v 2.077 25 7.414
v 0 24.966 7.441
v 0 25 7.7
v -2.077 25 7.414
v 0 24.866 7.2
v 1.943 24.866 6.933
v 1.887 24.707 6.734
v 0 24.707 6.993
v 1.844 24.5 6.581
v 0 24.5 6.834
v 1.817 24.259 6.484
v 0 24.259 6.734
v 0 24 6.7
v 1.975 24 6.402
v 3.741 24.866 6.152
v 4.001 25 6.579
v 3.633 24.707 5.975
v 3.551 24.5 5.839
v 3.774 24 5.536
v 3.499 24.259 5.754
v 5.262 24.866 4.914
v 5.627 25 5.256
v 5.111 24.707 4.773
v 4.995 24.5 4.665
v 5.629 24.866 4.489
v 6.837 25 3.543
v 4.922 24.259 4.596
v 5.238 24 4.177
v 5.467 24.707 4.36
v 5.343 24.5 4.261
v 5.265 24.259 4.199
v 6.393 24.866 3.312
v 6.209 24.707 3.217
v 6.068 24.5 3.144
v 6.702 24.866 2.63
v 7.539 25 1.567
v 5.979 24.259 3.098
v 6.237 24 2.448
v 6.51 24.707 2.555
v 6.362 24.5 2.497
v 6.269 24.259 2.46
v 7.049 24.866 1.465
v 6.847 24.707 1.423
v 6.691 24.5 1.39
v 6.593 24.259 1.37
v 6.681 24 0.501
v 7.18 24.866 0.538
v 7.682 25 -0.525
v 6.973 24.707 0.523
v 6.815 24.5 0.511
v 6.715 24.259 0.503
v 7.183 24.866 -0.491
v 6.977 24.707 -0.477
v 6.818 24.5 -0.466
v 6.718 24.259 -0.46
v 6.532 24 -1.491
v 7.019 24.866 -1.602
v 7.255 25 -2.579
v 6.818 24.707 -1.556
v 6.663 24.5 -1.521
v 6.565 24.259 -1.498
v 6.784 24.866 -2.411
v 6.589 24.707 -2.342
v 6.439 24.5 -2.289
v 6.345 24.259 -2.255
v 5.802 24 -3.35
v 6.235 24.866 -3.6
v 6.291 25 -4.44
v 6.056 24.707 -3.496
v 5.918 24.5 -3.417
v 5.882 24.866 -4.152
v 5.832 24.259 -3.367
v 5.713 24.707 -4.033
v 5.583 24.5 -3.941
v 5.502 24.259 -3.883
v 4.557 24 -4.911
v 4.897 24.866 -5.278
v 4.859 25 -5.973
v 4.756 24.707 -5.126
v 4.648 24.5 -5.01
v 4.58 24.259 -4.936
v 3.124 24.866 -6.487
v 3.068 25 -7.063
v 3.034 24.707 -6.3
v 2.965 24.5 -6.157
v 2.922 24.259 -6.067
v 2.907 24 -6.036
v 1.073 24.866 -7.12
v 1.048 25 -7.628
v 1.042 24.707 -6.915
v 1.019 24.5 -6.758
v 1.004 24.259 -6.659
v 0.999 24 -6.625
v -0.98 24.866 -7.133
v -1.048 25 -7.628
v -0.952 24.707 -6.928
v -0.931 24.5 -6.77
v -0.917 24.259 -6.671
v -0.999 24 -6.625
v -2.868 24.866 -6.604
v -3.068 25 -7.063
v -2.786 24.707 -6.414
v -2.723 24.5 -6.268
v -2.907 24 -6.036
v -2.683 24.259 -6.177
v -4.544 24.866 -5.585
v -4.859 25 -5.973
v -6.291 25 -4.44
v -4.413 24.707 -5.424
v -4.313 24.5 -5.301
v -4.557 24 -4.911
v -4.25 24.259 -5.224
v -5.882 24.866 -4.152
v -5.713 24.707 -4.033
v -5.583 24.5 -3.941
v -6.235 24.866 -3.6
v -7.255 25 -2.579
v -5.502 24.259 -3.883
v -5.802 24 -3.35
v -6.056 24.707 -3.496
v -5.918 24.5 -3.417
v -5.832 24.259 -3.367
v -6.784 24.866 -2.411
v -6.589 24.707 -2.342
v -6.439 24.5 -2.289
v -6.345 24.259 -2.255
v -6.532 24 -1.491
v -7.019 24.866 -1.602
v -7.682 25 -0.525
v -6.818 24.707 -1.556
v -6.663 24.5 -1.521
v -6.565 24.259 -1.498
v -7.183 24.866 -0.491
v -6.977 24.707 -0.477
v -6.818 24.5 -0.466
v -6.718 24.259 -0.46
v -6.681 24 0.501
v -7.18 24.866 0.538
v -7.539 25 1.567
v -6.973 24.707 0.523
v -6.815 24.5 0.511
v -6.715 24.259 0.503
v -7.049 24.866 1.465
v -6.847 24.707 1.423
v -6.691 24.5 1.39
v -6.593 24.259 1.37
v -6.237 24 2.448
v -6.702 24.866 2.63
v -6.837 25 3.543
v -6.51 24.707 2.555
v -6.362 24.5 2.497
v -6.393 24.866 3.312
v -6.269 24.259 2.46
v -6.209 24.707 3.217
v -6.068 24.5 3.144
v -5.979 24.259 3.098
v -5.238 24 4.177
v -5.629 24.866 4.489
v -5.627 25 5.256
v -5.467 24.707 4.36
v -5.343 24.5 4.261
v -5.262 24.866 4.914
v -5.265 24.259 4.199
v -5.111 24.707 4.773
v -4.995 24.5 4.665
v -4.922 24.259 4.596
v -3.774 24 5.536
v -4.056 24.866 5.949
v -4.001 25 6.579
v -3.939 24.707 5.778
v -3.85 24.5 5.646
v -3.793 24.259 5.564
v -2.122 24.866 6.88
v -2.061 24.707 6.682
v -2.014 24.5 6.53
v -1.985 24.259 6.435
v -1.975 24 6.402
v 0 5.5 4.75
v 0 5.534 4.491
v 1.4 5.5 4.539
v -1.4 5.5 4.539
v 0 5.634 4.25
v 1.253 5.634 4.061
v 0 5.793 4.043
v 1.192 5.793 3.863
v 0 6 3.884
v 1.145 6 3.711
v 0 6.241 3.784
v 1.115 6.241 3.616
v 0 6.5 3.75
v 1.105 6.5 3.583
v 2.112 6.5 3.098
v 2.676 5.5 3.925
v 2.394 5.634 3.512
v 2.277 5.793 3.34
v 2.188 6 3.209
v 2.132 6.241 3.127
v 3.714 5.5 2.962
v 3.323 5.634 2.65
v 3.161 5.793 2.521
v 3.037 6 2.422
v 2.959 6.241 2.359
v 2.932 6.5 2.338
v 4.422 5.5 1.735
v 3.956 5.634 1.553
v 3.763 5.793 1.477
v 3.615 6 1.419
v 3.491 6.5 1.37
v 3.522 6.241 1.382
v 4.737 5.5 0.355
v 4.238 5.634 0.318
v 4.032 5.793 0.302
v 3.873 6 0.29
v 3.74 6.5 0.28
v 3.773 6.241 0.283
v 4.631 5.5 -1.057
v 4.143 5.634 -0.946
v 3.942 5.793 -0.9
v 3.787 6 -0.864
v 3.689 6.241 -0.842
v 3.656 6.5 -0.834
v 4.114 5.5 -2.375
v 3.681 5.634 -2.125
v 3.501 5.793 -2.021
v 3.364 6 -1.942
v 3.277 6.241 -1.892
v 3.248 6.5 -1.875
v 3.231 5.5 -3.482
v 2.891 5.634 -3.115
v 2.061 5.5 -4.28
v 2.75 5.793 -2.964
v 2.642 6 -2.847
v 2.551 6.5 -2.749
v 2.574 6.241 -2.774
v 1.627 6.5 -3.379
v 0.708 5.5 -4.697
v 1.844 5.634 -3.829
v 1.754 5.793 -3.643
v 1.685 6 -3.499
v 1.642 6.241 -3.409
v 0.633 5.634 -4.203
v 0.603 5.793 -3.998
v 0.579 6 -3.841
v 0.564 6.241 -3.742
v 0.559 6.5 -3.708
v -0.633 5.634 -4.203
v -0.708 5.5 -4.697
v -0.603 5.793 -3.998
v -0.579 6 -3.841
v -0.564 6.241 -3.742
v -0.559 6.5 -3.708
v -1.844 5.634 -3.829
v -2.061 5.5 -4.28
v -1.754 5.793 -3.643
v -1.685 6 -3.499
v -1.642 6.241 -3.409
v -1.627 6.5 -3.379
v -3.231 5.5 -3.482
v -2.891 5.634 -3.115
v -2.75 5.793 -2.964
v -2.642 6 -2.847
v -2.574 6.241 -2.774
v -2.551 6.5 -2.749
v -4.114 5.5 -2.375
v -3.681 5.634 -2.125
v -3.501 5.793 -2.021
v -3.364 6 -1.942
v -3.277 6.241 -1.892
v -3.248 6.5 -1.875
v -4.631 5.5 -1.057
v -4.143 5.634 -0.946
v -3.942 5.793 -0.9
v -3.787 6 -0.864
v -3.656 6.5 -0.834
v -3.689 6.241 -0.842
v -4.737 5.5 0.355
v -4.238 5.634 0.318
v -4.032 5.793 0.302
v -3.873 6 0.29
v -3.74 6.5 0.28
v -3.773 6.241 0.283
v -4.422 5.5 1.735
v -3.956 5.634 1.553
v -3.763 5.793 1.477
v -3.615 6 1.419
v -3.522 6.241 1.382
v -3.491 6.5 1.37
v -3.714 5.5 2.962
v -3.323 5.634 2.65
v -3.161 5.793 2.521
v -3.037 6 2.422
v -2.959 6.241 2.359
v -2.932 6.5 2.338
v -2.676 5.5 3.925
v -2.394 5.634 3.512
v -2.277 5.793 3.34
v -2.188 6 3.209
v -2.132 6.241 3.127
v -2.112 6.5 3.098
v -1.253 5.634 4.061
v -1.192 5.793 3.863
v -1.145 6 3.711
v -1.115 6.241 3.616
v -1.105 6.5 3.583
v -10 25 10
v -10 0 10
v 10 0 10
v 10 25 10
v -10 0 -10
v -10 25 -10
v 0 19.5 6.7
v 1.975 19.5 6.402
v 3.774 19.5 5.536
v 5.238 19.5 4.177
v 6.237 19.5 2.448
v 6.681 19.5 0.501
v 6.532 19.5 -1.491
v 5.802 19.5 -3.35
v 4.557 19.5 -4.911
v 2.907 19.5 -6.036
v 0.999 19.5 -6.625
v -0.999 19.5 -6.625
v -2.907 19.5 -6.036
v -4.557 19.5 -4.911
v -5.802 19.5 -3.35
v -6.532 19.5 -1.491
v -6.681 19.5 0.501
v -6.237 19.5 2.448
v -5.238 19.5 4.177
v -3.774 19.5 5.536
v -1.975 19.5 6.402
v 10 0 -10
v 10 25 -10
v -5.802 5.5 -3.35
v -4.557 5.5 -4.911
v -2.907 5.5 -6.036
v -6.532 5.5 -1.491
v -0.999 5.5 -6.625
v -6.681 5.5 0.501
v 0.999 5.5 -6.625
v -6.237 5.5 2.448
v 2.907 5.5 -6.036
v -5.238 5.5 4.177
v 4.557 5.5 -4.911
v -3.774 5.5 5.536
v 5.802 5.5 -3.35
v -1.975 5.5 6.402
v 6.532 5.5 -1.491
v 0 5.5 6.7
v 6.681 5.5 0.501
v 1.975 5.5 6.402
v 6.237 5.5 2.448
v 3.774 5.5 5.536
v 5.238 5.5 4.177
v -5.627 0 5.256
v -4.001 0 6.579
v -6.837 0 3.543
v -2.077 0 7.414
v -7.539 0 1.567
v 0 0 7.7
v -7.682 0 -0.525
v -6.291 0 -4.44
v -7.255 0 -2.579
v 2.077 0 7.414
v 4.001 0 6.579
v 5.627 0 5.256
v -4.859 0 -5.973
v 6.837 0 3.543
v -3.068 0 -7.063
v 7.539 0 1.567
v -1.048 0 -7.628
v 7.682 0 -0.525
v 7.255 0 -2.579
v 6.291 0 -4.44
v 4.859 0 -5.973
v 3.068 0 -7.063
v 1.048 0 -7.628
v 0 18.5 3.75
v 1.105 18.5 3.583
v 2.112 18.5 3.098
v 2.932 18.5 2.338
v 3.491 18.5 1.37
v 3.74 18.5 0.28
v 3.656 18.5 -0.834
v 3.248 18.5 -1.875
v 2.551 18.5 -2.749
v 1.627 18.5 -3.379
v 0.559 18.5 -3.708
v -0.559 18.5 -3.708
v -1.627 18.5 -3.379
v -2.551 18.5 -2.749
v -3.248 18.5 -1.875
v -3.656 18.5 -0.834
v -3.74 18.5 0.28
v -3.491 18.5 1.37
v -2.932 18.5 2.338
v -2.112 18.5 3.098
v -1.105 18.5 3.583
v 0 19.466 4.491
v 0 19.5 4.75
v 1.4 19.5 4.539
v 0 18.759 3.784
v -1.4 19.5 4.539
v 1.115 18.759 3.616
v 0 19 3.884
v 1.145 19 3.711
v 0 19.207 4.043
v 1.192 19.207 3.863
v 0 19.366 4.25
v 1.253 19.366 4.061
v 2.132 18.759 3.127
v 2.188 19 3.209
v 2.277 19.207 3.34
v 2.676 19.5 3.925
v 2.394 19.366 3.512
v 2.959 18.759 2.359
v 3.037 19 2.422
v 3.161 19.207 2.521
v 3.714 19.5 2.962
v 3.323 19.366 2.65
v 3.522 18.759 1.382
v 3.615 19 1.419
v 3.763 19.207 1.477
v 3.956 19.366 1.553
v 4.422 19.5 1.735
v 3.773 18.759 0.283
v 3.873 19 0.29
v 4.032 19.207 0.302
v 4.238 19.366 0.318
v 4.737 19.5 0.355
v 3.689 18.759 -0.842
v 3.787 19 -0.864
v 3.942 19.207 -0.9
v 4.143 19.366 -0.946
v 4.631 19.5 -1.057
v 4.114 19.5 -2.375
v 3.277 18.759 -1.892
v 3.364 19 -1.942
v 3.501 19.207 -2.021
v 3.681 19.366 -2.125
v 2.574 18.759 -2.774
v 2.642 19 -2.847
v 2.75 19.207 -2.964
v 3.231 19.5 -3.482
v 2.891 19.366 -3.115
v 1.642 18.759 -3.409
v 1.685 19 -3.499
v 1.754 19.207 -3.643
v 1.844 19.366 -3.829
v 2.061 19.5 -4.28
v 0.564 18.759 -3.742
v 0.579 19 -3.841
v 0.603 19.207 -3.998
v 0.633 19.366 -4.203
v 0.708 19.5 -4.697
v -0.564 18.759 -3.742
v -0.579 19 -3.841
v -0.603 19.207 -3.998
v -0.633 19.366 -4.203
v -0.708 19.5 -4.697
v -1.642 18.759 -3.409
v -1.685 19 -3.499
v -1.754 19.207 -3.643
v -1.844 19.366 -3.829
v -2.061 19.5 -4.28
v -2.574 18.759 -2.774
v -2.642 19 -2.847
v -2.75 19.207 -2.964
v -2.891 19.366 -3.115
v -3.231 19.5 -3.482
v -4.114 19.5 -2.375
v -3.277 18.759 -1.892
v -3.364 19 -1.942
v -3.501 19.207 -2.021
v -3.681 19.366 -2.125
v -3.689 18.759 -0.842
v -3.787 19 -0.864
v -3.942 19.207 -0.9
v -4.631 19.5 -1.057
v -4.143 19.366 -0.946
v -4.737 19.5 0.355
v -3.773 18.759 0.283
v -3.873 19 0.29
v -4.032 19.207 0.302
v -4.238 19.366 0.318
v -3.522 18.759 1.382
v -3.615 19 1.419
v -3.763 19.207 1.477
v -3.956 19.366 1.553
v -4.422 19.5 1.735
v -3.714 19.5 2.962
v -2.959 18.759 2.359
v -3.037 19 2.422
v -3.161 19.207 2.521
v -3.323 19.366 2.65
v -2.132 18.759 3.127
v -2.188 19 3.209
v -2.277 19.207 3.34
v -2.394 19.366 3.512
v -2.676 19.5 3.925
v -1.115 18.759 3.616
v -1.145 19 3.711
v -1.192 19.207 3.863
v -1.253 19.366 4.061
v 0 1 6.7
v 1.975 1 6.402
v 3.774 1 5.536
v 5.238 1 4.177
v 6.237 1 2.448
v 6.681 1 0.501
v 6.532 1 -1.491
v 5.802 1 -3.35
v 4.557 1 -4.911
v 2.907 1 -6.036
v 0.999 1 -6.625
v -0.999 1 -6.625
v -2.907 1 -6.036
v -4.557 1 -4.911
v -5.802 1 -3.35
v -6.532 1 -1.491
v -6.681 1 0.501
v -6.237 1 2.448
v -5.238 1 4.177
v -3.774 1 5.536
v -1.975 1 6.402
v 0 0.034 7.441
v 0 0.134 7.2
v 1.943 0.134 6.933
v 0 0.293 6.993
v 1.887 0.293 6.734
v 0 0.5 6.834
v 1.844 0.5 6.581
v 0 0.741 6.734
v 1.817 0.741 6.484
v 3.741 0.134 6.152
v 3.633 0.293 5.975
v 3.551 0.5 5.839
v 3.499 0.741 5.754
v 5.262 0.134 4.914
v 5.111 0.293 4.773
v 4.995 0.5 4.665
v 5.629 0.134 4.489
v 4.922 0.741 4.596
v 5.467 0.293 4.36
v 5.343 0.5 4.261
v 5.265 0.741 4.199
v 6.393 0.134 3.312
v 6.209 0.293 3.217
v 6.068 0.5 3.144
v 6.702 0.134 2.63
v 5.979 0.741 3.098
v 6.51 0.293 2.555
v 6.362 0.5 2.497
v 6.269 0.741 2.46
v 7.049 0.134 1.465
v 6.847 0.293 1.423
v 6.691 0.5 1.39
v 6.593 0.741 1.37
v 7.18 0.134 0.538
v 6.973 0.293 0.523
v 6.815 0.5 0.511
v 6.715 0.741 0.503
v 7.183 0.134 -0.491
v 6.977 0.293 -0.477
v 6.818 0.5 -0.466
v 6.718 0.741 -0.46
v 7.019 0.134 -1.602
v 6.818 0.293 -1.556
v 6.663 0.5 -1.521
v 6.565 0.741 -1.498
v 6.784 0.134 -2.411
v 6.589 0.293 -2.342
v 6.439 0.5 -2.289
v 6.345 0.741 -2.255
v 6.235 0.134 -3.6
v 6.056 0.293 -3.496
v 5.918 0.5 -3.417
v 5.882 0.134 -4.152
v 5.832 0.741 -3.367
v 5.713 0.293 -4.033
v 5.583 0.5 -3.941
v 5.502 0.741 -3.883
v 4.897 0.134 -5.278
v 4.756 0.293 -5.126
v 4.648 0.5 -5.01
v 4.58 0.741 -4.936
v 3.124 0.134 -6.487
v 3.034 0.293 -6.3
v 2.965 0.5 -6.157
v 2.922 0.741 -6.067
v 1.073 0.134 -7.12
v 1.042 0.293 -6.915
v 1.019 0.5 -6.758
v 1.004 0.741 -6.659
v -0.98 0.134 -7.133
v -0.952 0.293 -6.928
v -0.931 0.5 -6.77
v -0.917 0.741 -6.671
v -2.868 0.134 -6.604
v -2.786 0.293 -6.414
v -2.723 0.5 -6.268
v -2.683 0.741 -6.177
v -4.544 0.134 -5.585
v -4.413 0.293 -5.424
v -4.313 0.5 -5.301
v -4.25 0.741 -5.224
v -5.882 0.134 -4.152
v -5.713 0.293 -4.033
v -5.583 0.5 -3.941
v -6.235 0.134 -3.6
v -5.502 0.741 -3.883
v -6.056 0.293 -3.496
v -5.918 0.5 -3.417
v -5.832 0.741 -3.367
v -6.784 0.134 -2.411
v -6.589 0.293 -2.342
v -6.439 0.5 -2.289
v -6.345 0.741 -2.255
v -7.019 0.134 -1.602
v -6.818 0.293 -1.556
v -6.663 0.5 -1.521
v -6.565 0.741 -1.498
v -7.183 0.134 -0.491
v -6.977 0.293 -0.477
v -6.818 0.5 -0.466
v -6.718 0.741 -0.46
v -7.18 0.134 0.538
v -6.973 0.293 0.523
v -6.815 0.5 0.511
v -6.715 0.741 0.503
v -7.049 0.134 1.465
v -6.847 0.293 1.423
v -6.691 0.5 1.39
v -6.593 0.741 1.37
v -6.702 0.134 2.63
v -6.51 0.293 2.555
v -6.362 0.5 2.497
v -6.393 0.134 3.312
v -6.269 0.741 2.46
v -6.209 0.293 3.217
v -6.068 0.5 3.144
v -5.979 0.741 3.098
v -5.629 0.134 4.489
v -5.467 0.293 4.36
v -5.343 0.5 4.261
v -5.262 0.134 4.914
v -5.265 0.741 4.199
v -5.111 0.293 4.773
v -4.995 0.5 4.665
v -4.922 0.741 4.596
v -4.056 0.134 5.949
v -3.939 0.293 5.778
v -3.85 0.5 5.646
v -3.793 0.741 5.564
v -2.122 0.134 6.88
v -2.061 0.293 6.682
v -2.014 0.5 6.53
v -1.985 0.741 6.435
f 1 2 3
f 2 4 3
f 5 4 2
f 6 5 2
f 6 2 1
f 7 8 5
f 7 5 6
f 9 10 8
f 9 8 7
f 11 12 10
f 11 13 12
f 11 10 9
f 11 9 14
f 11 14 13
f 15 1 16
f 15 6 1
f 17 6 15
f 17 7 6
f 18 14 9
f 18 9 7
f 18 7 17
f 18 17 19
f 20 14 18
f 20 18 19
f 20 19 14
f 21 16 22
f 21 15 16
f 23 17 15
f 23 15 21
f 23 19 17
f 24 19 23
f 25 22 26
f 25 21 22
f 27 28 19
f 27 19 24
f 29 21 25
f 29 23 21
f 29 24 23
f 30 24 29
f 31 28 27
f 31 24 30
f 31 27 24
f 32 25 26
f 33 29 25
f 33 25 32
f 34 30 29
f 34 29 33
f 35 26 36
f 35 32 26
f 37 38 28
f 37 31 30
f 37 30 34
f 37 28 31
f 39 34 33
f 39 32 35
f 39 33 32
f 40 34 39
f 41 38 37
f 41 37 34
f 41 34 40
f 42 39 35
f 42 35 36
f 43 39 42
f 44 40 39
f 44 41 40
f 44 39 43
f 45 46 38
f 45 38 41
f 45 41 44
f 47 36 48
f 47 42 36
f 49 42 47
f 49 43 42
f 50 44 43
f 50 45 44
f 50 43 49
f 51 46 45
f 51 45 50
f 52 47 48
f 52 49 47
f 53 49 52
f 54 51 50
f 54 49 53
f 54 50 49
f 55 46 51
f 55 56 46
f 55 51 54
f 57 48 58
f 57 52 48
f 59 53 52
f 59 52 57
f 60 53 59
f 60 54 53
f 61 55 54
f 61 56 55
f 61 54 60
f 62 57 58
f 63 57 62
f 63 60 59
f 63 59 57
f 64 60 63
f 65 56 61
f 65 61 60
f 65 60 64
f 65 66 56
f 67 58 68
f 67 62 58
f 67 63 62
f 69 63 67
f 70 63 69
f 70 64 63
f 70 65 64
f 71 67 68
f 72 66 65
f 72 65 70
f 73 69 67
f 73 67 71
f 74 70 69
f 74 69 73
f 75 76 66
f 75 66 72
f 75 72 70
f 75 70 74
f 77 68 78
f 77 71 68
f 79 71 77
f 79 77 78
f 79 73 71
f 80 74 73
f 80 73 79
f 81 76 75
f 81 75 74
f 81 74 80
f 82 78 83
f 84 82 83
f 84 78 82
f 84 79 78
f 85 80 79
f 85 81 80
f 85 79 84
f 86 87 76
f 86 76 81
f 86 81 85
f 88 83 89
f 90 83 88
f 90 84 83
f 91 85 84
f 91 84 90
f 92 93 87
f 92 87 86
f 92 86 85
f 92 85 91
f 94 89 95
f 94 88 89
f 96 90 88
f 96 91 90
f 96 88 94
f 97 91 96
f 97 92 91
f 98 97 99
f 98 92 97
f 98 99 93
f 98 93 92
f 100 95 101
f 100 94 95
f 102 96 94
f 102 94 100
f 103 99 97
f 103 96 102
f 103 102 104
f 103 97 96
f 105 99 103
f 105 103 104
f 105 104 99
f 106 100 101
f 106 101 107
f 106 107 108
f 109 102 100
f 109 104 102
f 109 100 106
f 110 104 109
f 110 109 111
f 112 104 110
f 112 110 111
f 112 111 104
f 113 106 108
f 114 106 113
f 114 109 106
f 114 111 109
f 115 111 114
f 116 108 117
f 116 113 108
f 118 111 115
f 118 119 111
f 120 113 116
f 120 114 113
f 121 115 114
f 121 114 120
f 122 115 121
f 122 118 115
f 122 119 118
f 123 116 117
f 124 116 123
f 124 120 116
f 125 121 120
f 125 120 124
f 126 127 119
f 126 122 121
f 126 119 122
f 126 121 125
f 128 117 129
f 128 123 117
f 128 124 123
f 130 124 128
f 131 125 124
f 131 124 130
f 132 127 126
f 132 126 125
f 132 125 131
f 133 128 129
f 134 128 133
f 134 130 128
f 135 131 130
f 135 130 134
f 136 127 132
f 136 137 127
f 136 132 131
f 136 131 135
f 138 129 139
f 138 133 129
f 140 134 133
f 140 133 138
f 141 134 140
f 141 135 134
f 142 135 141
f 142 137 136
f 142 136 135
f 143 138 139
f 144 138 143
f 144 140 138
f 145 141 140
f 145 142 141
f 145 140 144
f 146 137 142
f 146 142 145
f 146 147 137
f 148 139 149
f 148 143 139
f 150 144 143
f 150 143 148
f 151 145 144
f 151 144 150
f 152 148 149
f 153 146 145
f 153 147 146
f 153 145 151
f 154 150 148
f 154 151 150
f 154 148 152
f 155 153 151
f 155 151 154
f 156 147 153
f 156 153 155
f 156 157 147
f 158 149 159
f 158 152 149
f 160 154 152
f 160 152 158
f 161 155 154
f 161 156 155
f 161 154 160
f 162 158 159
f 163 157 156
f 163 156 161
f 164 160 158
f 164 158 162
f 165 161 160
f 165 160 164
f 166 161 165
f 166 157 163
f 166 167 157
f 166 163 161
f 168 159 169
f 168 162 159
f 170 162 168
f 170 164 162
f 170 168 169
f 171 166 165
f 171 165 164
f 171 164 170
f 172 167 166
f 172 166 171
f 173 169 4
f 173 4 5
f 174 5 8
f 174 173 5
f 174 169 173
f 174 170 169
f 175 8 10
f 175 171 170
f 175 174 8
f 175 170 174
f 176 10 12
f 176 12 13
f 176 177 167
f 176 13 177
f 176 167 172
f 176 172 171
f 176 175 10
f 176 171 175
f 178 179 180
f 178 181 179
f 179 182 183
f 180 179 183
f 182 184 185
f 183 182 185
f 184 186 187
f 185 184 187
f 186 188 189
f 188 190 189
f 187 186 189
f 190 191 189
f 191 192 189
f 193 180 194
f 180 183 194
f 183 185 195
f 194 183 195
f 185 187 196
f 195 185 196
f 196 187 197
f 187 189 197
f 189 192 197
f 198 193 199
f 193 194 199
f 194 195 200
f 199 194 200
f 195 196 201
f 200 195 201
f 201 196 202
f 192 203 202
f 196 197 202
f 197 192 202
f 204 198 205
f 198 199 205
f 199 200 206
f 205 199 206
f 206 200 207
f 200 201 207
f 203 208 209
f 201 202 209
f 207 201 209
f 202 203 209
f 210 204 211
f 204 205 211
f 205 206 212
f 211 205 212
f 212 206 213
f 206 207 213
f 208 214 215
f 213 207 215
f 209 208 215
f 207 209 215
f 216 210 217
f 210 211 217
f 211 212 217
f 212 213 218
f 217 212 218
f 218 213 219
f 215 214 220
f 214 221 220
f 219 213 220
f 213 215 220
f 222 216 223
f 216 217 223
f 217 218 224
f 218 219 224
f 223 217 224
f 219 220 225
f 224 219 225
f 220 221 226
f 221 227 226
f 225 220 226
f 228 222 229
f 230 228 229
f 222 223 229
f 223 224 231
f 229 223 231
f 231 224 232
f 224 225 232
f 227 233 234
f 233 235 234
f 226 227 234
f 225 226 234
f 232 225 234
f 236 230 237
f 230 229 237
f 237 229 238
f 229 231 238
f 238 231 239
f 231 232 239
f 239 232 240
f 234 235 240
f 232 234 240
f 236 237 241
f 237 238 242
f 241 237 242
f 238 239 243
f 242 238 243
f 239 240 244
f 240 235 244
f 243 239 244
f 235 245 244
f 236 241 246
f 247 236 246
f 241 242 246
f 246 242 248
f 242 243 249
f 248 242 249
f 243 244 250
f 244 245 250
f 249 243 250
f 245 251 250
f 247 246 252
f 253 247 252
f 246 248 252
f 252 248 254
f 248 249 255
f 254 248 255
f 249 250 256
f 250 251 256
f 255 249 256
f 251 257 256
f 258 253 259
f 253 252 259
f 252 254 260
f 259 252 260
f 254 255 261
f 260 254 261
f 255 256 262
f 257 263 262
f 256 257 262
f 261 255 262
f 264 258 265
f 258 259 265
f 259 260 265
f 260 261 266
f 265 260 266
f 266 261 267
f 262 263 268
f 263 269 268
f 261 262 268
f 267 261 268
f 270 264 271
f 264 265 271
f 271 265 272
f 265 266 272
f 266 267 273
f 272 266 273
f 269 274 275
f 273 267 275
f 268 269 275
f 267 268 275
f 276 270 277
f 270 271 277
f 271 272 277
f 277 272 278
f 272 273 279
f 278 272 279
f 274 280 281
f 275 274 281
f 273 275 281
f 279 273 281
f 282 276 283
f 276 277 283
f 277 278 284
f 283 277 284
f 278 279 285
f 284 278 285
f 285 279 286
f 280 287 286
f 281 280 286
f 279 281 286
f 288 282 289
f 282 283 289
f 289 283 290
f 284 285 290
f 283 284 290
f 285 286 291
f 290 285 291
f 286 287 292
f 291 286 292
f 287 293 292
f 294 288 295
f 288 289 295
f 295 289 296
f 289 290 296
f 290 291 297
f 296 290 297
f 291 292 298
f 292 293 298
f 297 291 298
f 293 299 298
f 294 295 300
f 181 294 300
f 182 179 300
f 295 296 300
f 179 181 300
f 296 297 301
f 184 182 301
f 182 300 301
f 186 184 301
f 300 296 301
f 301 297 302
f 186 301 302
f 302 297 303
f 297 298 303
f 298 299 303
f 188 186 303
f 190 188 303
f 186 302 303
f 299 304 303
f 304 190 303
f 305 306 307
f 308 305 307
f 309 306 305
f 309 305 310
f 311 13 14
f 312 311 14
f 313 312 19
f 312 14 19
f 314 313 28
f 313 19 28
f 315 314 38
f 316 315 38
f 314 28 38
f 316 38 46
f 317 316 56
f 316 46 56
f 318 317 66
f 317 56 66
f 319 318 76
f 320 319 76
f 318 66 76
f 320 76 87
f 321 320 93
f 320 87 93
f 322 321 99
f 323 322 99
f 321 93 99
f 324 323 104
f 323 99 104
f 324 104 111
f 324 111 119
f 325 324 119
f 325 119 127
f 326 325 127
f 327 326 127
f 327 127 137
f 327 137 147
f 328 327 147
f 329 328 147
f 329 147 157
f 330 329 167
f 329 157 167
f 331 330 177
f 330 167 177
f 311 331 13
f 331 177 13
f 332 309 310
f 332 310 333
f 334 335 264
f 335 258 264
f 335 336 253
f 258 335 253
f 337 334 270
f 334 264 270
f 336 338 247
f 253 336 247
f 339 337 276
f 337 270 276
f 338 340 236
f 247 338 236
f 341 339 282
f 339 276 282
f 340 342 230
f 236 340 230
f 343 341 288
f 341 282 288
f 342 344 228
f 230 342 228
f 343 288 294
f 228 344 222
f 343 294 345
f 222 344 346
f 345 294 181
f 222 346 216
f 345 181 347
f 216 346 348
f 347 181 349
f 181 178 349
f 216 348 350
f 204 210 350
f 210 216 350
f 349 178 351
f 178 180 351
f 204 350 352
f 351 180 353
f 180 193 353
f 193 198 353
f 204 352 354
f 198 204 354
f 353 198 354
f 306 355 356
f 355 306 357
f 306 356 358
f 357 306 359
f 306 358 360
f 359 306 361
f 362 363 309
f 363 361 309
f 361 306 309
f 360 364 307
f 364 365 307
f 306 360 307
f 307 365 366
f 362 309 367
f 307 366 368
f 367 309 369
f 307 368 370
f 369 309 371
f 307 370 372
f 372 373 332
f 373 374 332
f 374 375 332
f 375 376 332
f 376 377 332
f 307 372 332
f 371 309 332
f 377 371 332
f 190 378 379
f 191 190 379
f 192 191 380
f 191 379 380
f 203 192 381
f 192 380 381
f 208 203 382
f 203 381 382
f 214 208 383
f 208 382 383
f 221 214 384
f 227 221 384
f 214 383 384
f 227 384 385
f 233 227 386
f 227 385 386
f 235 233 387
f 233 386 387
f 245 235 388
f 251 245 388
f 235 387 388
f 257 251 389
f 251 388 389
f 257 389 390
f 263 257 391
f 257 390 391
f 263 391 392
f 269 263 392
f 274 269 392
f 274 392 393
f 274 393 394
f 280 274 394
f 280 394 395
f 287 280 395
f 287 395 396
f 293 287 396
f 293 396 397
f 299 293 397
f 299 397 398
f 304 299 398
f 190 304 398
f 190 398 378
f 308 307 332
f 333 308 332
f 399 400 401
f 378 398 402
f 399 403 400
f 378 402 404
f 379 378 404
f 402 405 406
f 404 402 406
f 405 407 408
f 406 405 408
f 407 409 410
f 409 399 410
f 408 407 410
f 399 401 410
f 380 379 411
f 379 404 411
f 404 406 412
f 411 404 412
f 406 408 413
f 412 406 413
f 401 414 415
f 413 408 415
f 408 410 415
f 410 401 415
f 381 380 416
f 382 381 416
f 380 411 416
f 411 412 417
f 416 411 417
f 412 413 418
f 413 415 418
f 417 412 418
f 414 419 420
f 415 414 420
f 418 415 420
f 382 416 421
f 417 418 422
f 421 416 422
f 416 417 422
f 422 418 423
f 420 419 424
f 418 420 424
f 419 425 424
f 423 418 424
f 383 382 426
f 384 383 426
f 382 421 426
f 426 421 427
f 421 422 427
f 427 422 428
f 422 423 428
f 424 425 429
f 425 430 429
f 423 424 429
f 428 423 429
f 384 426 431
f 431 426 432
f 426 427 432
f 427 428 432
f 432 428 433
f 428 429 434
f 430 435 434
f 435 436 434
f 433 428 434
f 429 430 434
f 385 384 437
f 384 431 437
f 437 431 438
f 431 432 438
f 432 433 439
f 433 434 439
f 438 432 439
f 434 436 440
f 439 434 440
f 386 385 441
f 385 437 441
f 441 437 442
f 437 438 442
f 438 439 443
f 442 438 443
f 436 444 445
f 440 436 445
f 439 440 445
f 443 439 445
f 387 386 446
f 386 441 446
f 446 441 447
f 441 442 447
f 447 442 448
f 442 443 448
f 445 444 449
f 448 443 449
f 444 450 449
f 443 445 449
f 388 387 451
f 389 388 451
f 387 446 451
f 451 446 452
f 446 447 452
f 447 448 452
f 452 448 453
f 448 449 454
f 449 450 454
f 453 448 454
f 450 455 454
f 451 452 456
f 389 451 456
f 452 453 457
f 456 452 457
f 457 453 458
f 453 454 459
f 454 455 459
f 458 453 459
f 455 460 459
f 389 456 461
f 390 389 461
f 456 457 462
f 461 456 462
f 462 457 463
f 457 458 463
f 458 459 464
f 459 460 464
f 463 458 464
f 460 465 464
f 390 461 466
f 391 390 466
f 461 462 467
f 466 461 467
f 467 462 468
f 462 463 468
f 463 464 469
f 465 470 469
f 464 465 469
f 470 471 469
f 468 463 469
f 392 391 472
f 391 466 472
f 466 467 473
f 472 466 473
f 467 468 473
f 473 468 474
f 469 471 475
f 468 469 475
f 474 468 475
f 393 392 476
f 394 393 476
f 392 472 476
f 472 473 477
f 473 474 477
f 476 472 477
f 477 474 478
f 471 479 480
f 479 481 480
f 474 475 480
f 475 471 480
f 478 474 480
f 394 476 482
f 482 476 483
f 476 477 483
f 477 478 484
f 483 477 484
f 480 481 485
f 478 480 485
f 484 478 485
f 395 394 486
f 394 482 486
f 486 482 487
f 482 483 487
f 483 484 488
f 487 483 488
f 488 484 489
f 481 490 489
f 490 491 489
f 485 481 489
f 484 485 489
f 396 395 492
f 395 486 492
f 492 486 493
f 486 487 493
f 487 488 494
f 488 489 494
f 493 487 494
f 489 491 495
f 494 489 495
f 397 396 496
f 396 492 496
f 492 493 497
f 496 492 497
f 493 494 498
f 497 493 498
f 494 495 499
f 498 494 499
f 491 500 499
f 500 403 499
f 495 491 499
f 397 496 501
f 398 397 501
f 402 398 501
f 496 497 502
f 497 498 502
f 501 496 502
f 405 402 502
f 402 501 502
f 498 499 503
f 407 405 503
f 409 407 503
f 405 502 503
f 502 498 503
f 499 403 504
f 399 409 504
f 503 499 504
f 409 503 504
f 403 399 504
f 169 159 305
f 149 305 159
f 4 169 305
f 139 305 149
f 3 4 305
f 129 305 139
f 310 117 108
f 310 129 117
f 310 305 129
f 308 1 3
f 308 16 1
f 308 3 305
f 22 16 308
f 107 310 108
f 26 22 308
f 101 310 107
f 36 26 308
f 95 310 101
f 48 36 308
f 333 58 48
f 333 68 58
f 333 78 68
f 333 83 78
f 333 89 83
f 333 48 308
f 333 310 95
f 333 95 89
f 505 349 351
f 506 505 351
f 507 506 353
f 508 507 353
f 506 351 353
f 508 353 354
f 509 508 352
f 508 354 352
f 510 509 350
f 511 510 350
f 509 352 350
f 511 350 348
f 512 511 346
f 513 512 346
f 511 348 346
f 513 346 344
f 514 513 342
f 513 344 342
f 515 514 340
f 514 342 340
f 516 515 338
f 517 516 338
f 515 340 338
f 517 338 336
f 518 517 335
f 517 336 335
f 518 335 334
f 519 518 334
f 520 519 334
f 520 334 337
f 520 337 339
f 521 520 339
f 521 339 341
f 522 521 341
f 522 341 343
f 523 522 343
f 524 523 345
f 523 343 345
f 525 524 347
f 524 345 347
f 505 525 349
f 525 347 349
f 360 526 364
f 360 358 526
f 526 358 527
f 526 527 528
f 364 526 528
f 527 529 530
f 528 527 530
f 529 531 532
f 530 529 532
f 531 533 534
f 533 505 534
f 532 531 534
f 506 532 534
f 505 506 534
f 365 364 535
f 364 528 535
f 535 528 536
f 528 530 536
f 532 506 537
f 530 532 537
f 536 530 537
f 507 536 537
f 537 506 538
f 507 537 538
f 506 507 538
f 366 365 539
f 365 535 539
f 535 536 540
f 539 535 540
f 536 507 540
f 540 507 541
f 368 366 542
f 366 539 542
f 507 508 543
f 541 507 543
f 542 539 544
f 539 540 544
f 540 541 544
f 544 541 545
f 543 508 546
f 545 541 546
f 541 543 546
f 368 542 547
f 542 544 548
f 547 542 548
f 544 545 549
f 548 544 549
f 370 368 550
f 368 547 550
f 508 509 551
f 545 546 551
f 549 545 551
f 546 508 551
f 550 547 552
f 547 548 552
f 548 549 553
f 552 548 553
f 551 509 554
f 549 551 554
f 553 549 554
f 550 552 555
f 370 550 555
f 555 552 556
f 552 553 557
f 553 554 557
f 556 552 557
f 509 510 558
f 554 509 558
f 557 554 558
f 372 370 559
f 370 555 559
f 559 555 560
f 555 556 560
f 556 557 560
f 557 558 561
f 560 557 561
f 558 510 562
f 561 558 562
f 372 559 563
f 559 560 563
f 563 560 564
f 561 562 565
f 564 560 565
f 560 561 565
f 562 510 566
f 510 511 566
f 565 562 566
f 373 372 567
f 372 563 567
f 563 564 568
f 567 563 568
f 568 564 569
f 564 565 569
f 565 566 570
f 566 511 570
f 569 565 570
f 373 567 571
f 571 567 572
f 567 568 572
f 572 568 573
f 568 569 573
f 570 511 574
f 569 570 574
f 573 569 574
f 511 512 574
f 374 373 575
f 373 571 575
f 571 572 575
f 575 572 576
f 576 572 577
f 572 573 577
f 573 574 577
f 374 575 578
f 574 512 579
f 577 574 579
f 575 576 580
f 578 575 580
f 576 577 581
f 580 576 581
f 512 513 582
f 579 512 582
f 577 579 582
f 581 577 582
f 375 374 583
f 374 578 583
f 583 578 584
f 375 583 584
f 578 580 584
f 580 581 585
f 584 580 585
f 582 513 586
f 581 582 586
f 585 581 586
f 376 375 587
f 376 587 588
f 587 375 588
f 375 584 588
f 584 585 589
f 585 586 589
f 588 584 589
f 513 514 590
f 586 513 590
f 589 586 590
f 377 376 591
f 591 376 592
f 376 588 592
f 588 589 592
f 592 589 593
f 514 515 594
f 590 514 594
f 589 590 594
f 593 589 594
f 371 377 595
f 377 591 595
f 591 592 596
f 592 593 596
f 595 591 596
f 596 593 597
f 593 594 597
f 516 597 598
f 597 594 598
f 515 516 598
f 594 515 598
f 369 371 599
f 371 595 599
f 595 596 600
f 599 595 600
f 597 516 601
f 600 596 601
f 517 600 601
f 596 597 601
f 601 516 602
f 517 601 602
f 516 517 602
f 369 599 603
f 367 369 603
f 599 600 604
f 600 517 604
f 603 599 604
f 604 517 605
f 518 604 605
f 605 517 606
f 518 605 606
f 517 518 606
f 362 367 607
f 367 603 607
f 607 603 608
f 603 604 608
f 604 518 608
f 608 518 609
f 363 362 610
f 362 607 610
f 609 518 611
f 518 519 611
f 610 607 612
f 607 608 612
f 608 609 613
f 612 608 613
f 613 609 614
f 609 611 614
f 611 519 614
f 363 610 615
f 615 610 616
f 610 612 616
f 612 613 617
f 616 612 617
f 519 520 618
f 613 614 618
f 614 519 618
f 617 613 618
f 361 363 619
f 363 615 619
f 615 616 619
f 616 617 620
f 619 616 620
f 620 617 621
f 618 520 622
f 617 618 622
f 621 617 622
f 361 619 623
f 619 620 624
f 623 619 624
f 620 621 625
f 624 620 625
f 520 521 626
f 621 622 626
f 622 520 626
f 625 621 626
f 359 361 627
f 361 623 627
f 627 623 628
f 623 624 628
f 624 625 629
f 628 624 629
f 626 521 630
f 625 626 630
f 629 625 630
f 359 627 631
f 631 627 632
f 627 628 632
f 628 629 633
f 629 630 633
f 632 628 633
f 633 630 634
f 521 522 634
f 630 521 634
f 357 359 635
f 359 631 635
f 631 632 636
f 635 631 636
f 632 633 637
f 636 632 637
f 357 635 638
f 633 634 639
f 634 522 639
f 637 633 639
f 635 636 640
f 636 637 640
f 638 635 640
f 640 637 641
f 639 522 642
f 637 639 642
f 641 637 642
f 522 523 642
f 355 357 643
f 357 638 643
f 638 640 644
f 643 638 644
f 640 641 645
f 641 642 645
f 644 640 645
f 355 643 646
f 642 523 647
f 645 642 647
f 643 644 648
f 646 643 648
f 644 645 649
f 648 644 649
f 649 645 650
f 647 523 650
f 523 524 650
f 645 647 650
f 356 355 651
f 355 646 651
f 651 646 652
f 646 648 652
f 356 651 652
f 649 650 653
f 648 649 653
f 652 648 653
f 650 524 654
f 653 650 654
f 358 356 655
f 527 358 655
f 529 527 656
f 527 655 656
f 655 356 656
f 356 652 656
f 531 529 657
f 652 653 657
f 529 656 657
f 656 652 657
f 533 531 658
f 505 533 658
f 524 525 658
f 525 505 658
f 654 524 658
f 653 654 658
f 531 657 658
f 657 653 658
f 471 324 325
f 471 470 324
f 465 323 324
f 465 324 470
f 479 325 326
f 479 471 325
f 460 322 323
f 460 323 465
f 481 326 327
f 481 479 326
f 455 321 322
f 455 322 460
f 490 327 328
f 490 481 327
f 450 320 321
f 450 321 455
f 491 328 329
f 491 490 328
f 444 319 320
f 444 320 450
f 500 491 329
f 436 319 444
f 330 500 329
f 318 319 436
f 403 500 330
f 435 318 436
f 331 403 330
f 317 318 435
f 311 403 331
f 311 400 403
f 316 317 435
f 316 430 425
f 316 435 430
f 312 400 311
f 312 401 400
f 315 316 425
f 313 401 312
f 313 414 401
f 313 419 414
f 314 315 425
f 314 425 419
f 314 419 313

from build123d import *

# Parameters (mm, degrees)
SKETCH3_W           = 20
SKETCH3_H           = 20
BOSS_EXTRUDE1_DEPTH = 25
SKETCH4_R           = 3.75
CUT_EXTRUDE1_DEPTH  = 29.722813233
SKETCH4_3_R         = 6.7
CUT_EXTRUDE2_DEPTH  = 5.5
CUT_EXTRUDE3_START  = -19.5
SKETCH4_4_R         = 6.7
CUT_EXTRUDE3_DEPTH  = 5.5
FILLET1_R           = 1
FILLET2_R           = 1


with BuildPart() as part:
    # Sketch3 → Boss-Extrude1 (new body)
    with BuildSketch(Plane(origin=(0, 0, 0), x_dir=(1, 0, 0), z_dir=(0, 1, 0))):
        Rectangle(SKETCH3_W, SKETCH3_H)
    extrude(amount=BOSS_EXTRUDE1_DEPTH)

    # Sketch4 → Cut-Extrude1 (cut, through all)
    with BuildSketch(Plane(origin=(0, 25, 0), x_dir=(1, 0, 0), z_dir=(0, 1, 0))):
        with Locations(Location((0, 0, 0), (0, 0, 270))):
            Circle(SKETCH4_R)
    extrude(amount=-CUT_EXTRUDE1_DEPTH, mode=Mode.SUBTRACT)

    # Sketch4<3> → Cut-Extrude2 (cut)
    with BuildSketch(Plane(origin=(0, 25, 0), x_dir=(1, 0, 0), z_dir=(0, 1, 0))):
        with Locations(Location((0, 0, 0), (0, 0, 270))):
            Circle(SKETCH4_3_R)
    extrude(amount=-CUT_EXTRUDE2_DEPTH, mode=Mode.SUBTRACT)

    # Sketch4<4> → Cut-Extrude3 (cut)
    with BuildSketch(Plane(origin=(0, 25, 0), x_dir=(1, 0, 0), z_dir=(0, 1, 0)).offset(CUT_EXTRUDE3_START)):
        with Locations(Location((0, 0, 0), (0, 0, 270))):
            Circle(SKETCH4_4_R)
    extrude(amount=-CUT_EXTRUDE3_DEPTH, mode=Mode.SUBTRACT)

    # Fillet1
    fillet1_edges = [part.edges().sort_by_distance(p)[0] for p in [
        (0, 25, -6.7),
        (0, 0, -6.7),
    ]]
    fillet(fillet1_edges, radius=FILLET1_R)

    # Fillet2
    fillet2_edges = [part.edges().sort_by_distance(p)[0] for p in [
        (0, 19.5, -3.75),
        (0, 5.5, -3.75),
    ]]
    fillet(fillet2_edges, radius=FILLET2_R)


solid = part.part
